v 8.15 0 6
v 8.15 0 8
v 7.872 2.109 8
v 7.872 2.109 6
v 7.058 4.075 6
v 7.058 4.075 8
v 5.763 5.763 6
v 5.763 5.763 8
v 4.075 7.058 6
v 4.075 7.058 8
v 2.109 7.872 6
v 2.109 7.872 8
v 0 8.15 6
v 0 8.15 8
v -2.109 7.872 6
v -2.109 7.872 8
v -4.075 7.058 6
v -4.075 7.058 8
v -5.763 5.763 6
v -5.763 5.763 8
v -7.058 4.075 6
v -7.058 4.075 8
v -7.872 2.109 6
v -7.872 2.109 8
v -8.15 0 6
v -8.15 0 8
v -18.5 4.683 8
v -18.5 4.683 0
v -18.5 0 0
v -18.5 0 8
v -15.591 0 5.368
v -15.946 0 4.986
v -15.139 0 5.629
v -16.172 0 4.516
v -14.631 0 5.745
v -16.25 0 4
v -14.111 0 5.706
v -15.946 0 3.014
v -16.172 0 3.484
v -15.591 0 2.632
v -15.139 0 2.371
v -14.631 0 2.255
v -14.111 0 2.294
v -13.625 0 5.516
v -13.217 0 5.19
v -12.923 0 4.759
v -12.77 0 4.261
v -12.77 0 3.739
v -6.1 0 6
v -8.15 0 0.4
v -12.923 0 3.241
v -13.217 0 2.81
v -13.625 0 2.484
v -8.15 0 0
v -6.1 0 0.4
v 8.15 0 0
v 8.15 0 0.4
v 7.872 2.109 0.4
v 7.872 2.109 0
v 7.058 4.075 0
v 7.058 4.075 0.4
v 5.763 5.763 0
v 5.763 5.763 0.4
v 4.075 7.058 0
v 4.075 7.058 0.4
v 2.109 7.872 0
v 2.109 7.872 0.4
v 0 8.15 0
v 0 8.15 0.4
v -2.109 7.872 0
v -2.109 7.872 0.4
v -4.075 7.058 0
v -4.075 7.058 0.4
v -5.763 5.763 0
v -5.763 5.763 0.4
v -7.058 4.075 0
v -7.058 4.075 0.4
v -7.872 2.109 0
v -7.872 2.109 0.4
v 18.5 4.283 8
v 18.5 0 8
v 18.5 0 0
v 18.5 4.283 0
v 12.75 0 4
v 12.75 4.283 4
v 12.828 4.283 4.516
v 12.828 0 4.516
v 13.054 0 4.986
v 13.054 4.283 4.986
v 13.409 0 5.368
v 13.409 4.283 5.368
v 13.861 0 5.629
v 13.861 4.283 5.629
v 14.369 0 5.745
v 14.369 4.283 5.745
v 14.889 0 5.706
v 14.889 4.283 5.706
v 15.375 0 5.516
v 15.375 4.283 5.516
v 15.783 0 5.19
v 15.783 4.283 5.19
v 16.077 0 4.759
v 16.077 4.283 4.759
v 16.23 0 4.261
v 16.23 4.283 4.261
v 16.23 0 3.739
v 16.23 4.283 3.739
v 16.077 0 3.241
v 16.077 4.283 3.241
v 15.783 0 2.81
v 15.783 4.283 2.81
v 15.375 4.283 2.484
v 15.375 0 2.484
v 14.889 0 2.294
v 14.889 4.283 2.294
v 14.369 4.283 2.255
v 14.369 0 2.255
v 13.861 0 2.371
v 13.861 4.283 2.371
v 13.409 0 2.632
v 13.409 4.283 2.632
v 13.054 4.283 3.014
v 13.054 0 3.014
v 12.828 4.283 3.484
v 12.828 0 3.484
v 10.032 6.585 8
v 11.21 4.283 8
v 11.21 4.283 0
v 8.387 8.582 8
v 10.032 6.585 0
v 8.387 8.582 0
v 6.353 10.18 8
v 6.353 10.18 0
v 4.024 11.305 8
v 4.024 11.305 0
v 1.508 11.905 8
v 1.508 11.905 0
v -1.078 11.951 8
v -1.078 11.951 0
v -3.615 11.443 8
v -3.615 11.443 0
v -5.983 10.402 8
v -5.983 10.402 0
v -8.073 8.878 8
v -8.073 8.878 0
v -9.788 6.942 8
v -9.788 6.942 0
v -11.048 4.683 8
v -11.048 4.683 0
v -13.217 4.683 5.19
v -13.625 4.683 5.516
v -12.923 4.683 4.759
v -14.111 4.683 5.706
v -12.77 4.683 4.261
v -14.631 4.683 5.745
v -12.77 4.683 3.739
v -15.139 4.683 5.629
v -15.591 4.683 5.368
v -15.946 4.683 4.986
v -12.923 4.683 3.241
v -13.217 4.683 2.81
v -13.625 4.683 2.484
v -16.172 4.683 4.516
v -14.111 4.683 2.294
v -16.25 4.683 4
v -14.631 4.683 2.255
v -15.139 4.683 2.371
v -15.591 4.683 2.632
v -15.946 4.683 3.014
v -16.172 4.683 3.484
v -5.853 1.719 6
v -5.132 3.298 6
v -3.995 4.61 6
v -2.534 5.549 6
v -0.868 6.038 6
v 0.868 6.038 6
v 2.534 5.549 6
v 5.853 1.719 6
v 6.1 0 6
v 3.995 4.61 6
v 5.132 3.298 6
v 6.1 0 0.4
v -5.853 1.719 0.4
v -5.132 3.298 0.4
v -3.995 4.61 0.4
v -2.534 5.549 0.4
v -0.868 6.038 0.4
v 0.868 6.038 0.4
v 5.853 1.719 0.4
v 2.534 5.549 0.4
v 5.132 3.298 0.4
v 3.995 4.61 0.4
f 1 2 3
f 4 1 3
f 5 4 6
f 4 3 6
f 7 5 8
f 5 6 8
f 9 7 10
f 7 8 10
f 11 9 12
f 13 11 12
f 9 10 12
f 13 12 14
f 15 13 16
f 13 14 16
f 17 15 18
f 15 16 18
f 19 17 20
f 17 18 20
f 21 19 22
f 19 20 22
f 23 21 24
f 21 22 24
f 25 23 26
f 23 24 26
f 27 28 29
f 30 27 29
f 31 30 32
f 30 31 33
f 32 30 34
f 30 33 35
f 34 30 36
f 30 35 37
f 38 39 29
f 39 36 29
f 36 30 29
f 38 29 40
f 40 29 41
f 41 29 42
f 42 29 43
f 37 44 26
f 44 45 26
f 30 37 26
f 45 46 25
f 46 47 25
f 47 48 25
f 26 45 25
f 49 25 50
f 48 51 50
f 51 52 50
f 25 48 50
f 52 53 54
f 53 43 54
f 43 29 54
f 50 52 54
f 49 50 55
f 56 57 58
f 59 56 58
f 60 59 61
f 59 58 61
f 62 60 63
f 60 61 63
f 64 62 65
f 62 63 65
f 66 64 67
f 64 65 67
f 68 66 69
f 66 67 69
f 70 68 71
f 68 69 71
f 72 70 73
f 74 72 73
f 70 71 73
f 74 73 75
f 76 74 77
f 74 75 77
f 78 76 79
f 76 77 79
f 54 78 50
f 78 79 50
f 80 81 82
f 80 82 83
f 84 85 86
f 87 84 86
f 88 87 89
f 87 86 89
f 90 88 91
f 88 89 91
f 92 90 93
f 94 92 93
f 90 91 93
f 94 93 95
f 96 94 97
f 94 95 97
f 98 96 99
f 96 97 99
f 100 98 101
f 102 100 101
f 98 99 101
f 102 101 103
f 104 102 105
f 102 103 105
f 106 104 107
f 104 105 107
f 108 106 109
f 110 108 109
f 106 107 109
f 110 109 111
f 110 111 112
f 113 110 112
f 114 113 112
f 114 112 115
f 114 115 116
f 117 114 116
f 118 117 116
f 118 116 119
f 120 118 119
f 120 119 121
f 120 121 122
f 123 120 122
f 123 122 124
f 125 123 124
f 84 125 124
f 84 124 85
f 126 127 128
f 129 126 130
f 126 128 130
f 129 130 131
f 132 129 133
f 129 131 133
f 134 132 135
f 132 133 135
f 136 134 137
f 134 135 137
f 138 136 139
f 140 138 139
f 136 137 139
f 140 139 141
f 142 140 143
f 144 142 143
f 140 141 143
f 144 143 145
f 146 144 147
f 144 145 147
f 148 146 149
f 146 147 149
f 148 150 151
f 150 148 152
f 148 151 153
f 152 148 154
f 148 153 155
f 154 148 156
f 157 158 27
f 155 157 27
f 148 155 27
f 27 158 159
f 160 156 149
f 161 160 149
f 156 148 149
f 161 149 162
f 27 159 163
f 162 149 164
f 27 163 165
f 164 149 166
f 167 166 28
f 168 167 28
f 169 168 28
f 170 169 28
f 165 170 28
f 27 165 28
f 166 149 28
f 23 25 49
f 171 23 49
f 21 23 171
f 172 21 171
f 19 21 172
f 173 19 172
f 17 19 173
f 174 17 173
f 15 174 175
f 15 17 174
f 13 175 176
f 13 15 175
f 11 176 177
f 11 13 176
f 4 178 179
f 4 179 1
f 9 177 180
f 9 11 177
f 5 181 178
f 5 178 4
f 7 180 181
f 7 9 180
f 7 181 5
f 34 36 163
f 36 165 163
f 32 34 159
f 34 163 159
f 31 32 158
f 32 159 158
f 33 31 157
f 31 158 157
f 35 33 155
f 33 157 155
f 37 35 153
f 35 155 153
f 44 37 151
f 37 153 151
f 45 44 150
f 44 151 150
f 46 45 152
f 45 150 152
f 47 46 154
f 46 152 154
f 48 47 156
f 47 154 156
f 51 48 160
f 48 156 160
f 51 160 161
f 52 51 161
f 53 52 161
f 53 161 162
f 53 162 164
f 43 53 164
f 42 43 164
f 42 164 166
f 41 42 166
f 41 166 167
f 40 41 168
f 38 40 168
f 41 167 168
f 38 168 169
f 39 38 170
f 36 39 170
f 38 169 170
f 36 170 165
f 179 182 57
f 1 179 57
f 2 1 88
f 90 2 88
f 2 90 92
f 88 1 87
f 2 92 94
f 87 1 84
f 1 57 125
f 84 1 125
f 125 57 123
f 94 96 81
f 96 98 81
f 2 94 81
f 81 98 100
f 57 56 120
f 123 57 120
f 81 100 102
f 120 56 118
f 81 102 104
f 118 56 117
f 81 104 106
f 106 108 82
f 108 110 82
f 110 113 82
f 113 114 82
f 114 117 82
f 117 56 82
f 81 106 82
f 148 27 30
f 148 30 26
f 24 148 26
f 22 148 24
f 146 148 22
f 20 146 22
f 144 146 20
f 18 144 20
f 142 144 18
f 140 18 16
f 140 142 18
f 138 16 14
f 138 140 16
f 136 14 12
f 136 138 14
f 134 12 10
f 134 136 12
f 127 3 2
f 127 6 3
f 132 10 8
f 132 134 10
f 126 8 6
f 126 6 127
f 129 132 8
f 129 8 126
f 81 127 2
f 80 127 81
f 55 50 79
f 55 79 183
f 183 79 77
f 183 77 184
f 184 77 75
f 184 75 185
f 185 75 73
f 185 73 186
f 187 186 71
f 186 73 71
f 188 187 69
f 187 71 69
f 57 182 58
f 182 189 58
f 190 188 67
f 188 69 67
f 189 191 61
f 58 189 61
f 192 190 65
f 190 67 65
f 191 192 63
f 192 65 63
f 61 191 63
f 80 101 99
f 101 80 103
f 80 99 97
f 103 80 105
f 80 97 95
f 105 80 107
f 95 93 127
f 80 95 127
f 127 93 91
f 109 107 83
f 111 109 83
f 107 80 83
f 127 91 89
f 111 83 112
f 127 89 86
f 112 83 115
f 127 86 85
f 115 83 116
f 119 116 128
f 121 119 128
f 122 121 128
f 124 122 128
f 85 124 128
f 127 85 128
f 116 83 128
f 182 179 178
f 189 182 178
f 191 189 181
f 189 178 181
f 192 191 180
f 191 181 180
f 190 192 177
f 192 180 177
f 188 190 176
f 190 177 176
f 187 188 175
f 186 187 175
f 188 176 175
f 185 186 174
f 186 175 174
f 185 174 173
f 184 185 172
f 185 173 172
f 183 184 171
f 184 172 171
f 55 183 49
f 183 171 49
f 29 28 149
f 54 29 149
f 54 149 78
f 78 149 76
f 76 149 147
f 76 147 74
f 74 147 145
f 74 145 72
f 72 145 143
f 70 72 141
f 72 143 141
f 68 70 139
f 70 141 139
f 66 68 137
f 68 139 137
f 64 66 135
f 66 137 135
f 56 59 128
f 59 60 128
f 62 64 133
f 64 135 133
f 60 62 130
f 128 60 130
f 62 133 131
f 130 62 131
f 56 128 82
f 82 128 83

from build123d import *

# Parameters (mm, degrees)
F1_DEPTH  = 8
F2_R      = 1.75
F3_DEPTH  = 4.2837432044
F4_R      = 1.75
F5_DEPTH  = 25
F6_R      = 8.15
F7_DEPTH  = 2
F8_R      = 6.1
F9_DEPTH  = 5.6
F10_R     = 8.15
F11_DEPTH = 25


with BuildPart() as f1:
    # F0 (on Top) → F1 (new body)
    with BuildSketch(Plane.XY):
        with BuildLine():
            Line((18.5, 4.2827432044), (11.2097328534, 4.2827432044))
            ThreePointArc((11.2097328534, 4.2827432044), (0.2159454588, 11.9980568243), (-11.0483577501, 4.6833525412))
            Line((-11.0483577501, 4.6833525412), (-18.5, 4.6833525412))
            Line((-18.5, 4.6833525412), (-18.5, 0))
            Line((-18.5, 0), (-12, 0))
            Line((-12, 0), (12, 0))
            Line((12, 0), (18.5, 0))
            Line((18.5, 0), (18.5, 4.2827432044))
        make_face()
    extrude(amount=F1_DEPTH)

    # F2 (on face) → F3 (cut, through all)
    with BuildSketch(Plane(origin=(0, 4.2827432044, 0), x_dir=(-1, 0, 0), z_dir=(0, 1, 0))):
        with Locations((-14.5, 4)):
            Circle(F2_R)
        with Locations((14.5, 4)):
            Circle(F2_R)
    extrude(amount=-F3_DEPTH, mode=Mode.SUBTRACT)

    # F4 (on face) → F5 (cut)
    with BuildSketch(Plane(origin=(0, 4.6833525412, 0), x_dir=(-1, 0, 0), z_dir=(0, 1, 0))):
        with Locations((14.5, 4)):
            Circle(F4_R)
    extrude(amount=-F5_DEPTH, mode=Mode.SUBTRACT)

    # F6 (on face) → F7 (cut)
    with BuildSketch(Plane.XY.offset(8)):
        Circle(F6_R)
    extrude(amount=-F7_DEPTH, mode=Mode.SUBTRACT)

    # F8 (on face) → F9 (cut)
    with BuildSketch(Plane.XY.offset(6)):
        Circle(F8_R)
    extrude(amount=-F9_DEPTH, mode=Mode.SUBTRACT)

    # F10 (on face) → F11 (cut)
    with BuildSketch(Plane.XY.offset(0.4)):
        Circle(F10_R)
    extrude(amount=-F11_DEPTH, mode=Mode.SUBTRACT)


solid = f1.part
